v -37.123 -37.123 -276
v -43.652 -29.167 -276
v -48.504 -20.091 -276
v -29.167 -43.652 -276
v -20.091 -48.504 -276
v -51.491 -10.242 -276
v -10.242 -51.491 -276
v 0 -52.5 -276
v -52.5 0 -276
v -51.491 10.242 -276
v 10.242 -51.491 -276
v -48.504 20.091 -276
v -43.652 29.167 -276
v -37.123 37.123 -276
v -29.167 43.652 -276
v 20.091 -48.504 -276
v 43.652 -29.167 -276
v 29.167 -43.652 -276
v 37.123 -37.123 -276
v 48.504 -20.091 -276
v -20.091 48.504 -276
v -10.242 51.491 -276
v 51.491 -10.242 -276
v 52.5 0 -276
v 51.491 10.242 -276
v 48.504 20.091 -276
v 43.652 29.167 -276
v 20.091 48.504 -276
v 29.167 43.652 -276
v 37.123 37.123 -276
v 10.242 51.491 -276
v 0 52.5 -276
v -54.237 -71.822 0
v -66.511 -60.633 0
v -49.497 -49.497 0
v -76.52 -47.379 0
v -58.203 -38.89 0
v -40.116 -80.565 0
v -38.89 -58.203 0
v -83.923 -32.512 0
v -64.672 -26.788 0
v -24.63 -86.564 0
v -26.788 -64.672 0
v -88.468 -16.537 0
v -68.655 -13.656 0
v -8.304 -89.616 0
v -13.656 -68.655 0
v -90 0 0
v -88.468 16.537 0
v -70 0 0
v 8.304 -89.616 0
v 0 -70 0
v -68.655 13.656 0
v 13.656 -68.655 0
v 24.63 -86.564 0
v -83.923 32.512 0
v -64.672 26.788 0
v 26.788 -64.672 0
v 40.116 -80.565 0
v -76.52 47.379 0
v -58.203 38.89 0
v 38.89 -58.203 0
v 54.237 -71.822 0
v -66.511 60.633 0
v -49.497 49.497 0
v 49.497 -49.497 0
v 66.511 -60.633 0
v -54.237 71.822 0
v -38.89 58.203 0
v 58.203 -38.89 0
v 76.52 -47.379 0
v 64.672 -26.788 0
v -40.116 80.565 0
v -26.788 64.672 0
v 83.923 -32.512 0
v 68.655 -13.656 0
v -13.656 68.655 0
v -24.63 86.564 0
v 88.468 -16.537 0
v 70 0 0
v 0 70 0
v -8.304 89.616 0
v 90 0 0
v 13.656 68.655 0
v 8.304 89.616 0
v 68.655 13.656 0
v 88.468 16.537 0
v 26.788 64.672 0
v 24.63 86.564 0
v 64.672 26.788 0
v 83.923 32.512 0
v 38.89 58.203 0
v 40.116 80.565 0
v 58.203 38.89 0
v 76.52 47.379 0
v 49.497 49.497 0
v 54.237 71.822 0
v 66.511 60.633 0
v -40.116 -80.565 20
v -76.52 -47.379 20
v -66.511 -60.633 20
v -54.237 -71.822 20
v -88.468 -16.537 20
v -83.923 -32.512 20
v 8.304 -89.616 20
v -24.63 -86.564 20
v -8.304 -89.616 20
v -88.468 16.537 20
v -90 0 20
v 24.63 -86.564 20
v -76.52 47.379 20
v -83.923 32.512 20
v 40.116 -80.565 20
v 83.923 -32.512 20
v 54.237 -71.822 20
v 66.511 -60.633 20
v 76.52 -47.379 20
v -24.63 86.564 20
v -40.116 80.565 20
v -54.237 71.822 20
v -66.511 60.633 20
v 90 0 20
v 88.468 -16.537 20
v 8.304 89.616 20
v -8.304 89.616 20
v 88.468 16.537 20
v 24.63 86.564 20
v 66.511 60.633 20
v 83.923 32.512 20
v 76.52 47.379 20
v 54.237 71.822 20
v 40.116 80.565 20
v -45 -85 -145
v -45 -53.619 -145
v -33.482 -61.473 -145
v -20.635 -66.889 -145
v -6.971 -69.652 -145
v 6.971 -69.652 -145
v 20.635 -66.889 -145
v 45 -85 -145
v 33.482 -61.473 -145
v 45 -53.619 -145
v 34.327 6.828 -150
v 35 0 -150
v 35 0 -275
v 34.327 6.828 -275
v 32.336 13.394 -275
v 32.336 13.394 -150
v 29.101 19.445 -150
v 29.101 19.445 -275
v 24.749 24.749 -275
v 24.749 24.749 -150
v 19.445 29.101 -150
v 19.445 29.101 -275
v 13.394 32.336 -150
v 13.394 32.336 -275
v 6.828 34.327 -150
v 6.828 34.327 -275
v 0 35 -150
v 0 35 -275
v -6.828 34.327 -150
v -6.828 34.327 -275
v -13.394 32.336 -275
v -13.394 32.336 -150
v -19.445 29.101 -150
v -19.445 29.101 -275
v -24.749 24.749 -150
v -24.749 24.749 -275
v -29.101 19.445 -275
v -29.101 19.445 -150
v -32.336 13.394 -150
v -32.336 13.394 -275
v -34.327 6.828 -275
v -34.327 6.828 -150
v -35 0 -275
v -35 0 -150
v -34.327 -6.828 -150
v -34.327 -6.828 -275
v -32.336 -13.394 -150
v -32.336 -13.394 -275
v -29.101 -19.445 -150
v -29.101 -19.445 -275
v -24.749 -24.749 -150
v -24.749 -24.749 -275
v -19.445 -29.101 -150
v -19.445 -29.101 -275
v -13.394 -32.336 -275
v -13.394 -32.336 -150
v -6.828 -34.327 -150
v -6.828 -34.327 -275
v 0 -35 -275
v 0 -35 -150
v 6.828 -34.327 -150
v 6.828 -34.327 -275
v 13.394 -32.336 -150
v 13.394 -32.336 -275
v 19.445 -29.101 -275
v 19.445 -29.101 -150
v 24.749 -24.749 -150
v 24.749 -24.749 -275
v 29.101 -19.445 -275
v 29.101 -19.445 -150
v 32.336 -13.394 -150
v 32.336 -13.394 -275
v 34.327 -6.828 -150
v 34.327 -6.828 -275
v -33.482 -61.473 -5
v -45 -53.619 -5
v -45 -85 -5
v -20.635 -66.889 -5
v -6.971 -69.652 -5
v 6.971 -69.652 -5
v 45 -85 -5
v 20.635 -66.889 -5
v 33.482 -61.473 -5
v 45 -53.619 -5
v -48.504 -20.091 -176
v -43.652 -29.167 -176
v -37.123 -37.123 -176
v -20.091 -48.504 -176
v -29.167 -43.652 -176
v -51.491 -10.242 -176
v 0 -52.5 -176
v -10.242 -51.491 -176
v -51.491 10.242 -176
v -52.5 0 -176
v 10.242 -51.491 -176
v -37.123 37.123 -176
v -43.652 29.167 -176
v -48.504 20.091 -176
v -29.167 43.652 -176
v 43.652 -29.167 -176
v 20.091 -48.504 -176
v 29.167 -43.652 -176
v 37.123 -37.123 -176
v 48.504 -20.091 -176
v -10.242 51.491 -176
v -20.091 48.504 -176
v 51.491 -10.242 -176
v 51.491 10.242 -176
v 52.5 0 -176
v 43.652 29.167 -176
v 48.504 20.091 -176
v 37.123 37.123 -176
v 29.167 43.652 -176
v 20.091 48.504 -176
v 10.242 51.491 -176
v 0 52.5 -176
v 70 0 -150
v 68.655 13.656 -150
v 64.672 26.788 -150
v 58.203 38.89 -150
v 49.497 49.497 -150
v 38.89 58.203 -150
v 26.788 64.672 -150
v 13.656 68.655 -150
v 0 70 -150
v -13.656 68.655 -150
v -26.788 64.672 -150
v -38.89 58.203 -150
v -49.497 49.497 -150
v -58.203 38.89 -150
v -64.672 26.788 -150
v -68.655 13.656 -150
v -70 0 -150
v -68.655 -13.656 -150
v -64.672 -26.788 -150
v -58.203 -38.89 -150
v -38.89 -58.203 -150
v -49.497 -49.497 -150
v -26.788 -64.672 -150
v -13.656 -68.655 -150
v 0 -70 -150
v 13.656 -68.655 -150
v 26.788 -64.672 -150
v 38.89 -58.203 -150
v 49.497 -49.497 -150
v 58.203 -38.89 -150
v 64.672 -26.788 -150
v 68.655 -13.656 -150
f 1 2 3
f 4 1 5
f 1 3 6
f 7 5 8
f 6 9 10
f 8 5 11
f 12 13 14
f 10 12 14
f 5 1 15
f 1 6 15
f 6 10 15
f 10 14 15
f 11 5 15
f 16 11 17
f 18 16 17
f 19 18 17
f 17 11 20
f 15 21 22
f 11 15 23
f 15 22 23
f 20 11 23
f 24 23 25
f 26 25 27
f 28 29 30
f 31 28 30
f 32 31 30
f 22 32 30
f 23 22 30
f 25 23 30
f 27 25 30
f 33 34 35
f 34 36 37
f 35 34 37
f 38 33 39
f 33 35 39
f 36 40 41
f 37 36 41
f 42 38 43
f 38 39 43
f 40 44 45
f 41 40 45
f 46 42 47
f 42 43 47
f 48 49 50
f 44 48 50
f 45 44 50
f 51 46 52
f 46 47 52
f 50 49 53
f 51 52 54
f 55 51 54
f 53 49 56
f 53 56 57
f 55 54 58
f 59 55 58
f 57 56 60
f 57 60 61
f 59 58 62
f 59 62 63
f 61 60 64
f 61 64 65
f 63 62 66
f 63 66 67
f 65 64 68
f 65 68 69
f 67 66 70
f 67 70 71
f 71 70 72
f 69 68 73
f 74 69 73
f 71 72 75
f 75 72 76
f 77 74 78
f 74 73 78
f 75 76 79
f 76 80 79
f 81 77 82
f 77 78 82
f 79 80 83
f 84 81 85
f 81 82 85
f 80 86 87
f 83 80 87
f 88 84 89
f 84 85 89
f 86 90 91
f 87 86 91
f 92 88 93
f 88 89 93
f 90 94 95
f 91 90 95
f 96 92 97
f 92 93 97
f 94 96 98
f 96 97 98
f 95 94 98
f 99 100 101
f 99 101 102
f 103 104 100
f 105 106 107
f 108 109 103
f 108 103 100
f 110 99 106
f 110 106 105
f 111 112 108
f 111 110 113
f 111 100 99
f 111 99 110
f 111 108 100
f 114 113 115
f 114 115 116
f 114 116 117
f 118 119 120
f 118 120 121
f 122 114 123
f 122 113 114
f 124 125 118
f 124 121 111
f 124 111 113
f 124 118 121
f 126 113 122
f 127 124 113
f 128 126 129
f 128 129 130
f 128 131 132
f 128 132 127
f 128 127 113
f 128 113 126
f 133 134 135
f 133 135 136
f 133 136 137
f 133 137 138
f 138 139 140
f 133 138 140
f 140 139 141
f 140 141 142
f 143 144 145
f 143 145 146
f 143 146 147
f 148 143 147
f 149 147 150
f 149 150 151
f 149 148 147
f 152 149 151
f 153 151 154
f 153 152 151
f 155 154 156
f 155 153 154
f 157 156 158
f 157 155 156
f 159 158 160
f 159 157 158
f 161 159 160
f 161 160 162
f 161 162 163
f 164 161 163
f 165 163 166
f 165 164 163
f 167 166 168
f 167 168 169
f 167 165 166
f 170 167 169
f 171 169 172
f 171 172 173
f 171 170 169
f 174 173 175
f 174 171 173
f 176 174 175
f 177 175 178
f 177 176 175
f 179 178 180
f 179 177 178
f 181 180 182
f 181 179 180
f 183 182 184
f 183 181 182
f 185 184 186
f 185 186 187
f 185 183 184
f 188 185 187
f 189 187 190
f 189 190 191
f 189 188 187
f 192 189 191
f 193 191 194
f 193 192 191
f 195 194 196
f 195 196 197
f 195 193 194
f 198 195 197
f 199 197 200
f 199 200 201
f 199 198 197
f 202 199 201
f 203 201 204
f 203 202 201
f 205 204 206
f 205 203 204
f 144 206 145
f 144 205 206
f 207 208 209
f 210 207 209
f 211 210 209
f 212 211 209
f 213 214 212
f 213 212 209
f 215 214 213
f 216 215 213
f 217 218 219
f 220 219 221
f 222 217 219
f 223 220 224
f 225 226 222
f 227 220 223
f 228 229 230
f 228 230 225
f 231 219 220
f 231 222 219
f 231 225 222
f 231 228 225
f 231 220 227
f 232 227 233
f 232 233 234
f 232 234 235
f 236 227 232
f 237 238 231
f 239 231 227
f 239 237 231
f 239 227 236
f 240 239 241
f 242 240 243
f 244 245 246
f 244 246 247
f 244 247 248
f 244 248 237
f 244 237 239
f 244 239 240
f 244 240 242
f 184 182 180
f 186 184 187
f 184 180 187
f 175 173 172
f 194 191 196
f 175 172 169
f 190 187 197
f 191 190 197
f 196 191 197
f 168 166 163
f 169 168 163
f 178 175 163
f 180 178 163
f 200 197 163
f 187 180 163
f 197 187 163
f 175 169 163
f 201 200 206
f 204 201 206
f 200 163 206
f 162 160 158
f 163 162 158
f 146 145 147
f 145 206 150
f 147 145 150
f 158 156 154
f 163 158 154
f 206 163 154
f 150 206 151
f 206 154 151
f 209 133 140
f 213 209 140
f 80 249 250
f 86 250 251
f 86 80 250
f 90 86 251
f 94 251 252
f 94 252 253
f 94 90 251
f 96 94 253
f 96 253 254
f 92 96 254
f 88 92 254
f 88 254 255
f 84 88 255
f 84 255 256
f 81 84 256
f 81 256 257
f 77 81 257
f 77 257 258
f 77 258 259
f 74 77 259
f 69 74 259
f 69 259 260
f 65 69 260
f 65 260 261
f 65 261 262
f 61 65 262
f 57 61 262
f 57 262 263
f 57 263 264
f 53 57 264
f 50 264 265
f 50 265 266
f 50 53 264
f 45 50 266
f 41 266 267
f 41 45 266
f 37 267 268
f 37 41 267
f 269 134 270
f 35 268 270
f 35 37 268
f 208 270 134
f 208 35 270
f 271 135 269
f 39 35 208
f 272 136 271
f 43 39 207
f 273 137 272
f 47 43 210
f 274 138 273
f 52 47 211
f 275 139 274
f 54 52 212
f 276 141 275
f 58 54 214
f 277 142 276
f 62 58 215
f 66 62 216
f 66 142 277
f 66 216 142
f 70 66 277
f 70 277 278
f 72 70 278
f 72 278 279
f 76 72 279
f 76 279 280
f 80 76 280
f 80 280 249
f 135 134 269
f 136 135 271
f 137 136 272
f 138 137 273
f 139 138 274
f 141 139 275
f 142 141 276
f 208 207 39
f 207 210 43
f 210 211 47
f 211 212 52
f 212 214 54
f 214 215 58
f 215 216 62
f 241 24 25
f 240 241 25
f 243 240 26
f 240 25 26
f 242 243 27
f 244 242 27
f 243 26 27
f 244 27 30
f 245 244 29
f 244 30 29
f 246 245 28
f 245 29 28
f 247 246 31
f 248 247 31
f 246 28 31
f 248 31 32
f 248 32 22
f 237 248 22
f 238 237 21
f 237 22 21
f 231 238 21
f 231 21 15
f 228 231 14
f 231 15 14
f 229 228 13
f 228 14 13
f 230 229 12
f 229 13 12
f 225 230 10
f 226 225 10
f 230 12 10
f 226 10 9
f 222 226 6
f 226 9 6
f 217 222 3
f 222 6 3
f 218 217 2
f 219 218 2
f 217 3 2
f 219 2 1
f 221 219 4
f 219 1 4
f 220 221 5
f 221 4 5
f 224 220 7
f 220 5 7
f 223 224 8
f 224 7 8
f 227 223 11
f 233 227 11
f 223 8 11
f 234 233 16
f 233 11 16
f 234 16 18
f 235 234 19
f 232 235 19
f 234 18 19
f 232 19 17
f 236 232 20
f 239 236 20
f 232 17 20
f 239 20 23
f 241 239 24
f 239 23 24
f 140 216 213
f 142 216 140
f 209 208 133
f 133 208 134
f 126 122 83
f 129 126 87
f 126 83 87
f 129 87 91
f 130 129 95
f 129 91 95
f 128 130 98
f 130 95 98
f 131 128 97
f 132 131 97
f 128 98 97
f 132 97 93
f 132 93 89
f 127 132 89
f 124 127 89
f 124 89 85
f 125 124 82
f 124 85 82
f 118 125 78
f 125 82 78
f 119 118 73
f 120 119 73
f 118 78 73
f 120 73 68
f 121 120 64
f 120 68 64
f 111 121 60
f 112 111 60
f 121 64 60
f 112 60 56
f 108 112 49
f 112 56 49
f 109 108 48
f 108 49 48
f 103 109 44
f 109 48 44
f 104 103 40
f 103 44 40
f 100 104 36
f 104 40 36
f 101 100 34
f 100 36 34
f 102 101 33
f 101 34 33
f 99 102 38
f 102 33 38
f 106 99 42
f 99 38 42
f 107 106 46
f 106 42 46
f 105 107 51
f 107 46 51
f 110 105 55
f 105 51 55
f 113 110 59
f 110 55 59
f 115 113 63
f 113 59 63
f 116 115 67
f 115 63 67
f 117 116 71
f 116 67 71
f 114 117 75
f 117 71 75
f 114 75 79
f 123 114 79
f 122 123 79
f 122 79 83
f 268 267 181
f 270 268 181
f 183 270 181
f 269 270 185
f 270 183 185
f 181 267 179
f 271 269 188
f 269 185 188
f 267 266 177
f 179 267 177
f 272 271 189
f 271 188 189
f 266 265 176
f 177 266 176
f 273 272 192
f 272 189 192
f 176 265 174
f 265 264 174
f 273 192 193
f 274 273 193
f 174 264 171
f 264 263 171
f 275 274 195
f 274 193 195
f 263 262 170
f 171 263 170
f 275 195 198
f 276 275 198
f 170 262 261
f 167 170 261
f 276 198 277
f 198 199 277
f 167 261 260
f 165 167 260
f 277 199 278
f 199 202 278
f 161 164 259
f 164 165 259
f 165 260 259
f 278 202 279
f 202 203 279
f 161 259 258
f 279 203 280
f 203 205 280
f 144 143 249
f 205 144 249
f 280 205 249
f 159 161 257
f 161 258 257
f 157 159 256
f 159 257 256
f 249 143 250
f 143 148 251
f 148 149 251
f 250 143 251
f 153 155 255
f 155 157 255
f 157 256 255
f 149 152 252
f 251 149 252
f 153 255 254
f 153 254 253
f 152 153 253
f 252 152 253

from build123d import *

# Parameters (mm, degrees)
CROQUIS2_R              = 90
SALIENTE_EXTRUIR2_DEPTH = 20
CROQUIS4_R              = 70
SALIENTE_EXTRUIR3_DEPTH = 150
CROQUIS5_R              = 35
SALIENTE_EXTRUIR4_DEPTH = 125
CROQUIS6_R              = 52.5
SALIENTE_EXTRUIR5_DEPTH = 100
CROQUIS7_W              = 90
CROQUIS7_H              = 140
SALIENTE_EXTRUIR7_DEPTH = 85


with BuildPart() as part:
    # Croquis2 → Saliente-Extruir2 (new body)
    with BuildSketch(Plane.XY):
        Circle(CROQUIS2_R)
    extrude(amount=SALIENTE_EXTRUIR2_DEPTH)

    # Croquis4 → Saliente-Extruir3 (add)
    with BuildSketch(Plane.XY):
        Circle(CROQUIS4_R)
    extrude(amount=-SALIENTE_EXTRUIR3_DEPTH)

    # Croquis5 → Saliente-Extruir4 (add)
    with BuildSketch(Plane.XY.offset(-150)):
        Circle(CROQUIS5_R)
    extrude(amount=-SALIENTE_EXTRUIR4_DEPTH)

    # Croquis7 → Saliente-Extruir7 (add)
    with BuildSketch(Plane(origin=(0, 0, 0), x_dir=(1, 0, 0), z_dir=(0, 1, 0))):
        with Locations((0, 75)):
            Rectangle(CROQUIS7_W, CROQUIS7_H)
    extrude(amount=-SALIENTE_EXTRUIR7_DEPTH)


with BuildPart() as body_2:
    # Croquis6 → Saliente-Extruir5 (new body)
    with BuildSketch(Plane.XY.offset(-276)):
        Circle(CROQUIS6_R)
    extrude(amount=SALIENTE_EXTRUIR5_DEPTH)


solid = Compound([part.part, body_2.part])
